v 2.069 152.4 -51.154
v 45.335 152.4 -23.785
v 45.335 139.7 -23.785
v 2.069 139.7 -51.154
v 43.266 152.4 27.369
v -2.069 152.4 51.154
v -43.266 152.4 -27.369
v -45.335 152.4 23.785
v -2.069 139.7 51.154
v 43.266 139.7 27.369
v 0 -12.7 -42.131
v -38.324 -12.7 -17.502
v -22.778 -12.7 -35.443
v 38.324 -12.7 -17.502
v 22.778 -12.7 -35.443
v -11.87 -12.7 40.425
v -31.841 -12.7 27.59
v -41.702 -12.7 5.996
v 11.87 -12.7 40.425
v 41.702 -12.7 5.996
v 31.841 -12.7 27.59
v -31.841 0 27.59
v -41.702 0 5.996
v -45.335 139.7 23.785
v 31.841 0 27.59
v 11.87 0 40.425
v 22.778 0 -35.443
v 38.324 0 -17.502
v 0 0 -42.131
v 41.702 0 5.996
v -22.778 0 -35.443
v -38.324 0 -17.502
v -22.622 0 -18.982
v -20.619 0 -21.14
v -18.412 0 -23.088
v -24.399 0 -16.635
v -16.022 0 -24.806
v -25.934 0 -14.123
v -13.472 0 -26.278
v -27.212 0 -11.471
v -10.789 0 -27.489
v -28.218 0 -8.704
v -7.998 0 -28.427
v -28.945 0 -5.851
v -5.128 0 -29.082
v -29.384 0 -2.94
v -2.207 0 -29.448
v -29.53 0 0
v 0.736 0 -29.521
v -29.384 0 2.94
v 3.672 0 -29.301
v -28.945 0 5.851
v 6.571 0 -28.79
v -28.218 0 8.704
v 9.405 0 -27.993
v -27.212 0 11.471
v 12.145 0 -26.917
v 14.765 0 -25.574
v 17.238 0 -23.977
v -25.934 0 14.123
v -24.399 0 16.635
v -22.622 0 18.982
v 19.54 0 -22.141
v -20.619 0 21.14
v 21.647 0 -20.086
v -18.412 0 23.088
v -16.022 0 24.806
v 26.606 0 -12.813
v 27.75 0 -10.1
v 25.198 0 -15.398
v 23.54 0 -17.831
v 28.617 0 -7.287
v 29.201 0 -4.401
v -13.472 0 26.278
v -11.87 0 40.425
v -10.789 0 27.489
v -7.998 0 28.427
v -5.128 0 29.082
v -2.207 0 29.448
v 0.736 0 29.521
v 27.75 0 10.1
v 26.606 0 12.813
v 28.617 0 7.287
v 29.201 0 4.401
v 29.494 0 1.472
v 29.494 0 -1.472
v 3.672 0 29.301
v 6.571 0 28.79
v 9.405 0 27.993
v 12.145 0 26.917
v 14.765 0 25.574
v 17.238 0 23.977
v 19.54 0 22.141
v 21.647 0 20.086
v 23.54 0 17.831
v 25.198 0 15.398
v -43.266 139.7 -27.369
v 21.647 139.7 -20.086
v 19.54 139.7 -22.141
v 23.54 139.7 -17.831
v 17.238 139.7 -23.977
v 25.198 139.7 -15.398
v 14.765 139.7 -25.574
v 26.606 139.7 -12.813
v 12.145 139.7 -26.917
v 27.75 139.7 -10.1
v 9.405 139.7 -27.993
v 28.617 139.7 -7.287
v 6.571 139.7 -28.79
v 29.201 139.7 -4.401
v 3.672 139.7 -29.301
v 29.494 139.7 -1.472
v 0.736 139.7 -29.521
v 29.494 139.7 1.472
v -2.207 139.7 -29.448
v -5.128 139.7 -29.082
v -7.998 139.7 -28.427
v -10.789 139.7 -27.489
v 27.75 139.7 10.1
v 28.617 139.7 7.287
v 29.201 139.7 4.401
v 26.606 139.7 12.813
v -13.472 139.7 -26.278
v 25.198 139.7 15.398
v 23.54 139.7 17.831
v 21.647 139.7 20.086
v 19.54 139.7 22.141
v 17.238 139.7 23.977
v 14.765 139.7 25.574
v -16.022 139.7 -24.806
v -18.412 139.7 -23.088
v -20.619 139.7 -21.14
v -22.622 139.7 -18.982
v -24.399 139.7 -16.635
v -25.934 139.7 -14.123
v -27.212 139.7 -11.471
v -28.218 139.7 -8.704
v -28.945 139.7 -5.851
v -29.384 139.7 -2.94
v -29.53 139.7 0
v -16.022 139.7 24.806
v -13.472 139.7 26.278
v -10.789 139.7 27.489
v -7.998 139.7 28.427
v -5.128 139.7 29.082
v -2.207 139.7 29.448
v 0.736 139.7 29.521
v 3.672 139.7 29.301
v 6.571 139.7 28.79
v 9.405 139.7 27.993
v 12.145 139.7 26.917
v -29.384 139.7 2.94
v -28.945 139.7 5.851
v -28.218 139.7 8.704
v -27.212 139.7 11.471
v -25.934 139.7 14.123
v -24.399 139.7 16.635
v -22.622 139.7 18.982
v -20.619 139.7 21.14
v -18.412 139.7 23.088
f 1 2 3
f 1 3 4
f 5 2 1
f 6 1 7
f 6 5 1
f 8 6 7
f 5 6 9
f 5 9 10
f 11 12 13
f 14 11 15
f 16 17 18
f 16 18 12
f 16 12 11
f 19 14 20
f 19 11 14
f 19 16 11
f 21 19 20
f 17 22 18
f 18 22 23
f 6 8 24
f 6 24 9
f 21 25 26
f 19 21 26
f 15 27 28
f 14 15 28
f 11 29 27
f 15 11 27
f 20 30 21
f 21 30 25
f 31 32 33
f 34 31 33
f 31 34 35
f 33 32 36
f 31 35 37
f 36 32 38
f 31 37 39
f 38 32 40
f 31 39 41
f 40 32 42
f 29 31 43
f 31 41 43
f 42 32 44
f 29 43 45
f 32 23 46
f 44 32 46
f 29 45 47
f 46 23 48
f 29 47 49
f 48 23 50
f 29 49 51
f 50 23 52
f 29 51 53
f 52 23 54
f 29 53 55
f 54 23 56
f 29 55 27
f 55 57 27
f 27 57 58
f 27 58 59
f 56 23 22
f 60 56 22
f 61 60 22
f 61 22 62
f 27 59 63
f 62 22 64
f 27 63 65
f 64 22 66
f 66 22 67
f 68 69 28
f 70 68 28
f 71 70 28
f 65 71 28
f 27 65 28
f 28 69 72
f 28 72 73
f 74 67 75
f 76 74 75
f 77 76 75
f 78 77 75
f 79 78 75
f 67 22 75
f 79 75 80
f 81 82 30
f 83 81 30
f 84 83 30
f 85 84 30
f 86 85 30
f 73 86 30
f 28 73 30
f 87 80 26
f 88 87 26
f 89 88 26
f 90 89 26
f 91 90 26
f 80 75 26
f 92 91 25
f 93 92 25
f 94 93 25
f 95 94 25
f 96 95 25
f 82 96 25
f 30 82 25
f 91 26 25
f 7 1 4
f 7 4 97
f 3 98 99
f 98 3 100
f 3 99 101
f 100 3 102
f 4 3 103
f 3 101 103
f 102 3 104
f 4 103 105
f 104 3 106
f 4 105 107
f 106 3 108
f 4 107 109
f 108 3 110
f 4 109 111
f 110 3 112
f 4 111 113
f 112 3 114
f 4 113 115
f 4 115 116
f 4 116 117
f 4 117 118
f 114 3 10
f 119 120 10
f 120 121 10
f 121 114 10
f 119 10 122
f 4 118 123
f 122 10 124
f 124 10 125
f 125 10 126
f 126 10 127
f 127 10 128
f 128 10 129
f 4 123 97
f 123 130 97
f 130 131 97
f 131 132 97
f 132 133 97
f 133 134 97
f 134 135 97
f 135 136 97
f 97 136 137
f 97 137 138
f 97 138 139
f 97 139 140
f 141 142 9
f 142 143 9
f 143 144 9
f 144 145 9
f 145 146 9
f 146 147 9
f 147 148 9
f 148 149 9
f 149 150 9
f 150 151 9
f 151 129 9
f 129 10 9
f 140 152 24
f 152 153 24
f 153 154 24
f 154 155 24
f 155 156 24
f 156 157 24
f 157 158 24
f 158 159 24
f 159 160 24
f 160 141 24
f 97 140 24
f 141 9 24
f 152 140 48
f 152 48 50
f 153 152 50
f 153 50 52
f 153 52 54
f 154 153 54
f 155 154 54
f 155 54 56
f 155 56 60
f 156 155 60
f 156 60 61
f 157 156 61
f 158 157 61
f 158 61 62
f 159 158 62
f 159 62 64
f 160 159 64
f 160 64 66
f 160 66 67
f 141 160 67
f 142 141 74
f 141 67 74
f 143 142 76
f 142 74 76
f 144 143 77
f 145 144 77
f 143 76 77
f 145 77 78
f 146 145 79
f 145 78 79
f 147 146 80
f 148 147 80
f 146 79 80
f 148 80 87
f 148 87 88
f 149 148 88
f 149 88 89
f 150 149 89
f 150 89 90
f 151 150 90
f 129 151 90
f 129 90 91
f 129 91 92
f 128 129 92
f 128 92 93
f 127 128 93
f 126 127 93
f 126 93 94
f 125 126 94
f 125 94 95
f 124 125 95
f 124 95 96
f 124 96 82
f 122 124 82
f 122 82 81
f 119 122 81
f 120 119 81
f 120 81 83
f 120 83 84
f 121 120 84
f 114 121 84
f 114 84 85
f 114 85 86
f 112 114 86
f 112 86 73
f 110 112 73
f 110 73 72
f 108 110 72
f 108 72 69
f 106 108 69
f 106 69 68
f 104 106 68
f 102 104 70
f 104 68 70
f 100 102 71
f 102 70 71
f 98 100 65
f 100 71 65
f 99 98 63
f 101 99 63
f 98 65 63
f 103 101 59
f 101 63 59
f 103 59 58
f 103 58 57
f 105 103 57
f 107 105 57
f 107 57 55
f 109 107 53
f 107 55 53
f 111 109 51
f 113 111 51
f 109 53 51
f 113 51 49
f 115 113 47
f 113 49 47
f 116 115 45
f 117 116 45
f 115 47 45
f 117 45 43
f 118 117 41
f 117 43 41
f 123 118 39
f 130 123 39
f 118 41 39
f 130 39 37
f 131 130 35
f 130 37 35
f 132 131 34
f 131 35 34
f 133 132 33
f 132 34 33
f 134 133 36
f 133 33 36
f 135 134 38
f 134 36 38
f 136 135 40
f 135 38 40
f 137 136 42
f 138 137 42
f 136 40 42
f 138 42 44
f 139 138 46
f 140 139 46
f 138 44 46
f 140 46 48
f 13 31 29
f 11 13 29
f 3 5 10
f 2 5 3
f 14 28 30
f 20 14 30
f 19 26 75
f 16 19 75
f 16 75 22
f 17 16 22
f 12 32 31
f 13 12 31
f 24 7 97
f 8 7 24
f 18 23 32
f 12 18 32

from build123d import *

# Parameters (mm, degrees)
F1_DEPTH = 12.7
F2_R     = 29.530414
F3_DEPTH = 152.4
F4_R     = 29.530414
F5_DEPTH = 12.7


with BuildPart() as f1:
    # F0 (on Front) → F1 (new body)
    with BuildSketch(Plane.XZ):
        Polygon((11.869742, 40.42463), (-11.869742, 40.42463), (-31.840668, 27.590096), (-41.702406, 5.995901), (-38.323925, -17.50195), (-22.777869, -35.443056), (0, -42.131241), (22.777869, -35.443056), (38.323925, -17.50195), (41.702406, 5.995901), (31.840668, 27.590096), align=None)
    extrude(amount=F1_DEPTH)

    # F2 (on face) → F3 (join)
    with BuildSketch(Plane(origin=(0, 0, 0), x_dir=(-1, 0, 0), z_dir=(0, 1, 0))):
        Circle(F2_R)
    extrude(amount=F3_DEPTH)

    # F4 (on face) → F5 (join)
    with BuildSketch(Plane(origin=(0, 152.4, 0), x_dir=(-1, 0, 0), z_dir=(0, 1, 0))):
        Polygon((45.335108, 23.784663), (2.069431, 51.153686), (-43.265676, 27.369023), (-45.335108, -23.784663), (-2.069431, -51.153686), (43.265676, -27.369023), align=None)
        Circle(F4_R, mode=Mode.SUBTRACT)
    extrude(amount=-F5_DEPTH)


solid = f1.part
